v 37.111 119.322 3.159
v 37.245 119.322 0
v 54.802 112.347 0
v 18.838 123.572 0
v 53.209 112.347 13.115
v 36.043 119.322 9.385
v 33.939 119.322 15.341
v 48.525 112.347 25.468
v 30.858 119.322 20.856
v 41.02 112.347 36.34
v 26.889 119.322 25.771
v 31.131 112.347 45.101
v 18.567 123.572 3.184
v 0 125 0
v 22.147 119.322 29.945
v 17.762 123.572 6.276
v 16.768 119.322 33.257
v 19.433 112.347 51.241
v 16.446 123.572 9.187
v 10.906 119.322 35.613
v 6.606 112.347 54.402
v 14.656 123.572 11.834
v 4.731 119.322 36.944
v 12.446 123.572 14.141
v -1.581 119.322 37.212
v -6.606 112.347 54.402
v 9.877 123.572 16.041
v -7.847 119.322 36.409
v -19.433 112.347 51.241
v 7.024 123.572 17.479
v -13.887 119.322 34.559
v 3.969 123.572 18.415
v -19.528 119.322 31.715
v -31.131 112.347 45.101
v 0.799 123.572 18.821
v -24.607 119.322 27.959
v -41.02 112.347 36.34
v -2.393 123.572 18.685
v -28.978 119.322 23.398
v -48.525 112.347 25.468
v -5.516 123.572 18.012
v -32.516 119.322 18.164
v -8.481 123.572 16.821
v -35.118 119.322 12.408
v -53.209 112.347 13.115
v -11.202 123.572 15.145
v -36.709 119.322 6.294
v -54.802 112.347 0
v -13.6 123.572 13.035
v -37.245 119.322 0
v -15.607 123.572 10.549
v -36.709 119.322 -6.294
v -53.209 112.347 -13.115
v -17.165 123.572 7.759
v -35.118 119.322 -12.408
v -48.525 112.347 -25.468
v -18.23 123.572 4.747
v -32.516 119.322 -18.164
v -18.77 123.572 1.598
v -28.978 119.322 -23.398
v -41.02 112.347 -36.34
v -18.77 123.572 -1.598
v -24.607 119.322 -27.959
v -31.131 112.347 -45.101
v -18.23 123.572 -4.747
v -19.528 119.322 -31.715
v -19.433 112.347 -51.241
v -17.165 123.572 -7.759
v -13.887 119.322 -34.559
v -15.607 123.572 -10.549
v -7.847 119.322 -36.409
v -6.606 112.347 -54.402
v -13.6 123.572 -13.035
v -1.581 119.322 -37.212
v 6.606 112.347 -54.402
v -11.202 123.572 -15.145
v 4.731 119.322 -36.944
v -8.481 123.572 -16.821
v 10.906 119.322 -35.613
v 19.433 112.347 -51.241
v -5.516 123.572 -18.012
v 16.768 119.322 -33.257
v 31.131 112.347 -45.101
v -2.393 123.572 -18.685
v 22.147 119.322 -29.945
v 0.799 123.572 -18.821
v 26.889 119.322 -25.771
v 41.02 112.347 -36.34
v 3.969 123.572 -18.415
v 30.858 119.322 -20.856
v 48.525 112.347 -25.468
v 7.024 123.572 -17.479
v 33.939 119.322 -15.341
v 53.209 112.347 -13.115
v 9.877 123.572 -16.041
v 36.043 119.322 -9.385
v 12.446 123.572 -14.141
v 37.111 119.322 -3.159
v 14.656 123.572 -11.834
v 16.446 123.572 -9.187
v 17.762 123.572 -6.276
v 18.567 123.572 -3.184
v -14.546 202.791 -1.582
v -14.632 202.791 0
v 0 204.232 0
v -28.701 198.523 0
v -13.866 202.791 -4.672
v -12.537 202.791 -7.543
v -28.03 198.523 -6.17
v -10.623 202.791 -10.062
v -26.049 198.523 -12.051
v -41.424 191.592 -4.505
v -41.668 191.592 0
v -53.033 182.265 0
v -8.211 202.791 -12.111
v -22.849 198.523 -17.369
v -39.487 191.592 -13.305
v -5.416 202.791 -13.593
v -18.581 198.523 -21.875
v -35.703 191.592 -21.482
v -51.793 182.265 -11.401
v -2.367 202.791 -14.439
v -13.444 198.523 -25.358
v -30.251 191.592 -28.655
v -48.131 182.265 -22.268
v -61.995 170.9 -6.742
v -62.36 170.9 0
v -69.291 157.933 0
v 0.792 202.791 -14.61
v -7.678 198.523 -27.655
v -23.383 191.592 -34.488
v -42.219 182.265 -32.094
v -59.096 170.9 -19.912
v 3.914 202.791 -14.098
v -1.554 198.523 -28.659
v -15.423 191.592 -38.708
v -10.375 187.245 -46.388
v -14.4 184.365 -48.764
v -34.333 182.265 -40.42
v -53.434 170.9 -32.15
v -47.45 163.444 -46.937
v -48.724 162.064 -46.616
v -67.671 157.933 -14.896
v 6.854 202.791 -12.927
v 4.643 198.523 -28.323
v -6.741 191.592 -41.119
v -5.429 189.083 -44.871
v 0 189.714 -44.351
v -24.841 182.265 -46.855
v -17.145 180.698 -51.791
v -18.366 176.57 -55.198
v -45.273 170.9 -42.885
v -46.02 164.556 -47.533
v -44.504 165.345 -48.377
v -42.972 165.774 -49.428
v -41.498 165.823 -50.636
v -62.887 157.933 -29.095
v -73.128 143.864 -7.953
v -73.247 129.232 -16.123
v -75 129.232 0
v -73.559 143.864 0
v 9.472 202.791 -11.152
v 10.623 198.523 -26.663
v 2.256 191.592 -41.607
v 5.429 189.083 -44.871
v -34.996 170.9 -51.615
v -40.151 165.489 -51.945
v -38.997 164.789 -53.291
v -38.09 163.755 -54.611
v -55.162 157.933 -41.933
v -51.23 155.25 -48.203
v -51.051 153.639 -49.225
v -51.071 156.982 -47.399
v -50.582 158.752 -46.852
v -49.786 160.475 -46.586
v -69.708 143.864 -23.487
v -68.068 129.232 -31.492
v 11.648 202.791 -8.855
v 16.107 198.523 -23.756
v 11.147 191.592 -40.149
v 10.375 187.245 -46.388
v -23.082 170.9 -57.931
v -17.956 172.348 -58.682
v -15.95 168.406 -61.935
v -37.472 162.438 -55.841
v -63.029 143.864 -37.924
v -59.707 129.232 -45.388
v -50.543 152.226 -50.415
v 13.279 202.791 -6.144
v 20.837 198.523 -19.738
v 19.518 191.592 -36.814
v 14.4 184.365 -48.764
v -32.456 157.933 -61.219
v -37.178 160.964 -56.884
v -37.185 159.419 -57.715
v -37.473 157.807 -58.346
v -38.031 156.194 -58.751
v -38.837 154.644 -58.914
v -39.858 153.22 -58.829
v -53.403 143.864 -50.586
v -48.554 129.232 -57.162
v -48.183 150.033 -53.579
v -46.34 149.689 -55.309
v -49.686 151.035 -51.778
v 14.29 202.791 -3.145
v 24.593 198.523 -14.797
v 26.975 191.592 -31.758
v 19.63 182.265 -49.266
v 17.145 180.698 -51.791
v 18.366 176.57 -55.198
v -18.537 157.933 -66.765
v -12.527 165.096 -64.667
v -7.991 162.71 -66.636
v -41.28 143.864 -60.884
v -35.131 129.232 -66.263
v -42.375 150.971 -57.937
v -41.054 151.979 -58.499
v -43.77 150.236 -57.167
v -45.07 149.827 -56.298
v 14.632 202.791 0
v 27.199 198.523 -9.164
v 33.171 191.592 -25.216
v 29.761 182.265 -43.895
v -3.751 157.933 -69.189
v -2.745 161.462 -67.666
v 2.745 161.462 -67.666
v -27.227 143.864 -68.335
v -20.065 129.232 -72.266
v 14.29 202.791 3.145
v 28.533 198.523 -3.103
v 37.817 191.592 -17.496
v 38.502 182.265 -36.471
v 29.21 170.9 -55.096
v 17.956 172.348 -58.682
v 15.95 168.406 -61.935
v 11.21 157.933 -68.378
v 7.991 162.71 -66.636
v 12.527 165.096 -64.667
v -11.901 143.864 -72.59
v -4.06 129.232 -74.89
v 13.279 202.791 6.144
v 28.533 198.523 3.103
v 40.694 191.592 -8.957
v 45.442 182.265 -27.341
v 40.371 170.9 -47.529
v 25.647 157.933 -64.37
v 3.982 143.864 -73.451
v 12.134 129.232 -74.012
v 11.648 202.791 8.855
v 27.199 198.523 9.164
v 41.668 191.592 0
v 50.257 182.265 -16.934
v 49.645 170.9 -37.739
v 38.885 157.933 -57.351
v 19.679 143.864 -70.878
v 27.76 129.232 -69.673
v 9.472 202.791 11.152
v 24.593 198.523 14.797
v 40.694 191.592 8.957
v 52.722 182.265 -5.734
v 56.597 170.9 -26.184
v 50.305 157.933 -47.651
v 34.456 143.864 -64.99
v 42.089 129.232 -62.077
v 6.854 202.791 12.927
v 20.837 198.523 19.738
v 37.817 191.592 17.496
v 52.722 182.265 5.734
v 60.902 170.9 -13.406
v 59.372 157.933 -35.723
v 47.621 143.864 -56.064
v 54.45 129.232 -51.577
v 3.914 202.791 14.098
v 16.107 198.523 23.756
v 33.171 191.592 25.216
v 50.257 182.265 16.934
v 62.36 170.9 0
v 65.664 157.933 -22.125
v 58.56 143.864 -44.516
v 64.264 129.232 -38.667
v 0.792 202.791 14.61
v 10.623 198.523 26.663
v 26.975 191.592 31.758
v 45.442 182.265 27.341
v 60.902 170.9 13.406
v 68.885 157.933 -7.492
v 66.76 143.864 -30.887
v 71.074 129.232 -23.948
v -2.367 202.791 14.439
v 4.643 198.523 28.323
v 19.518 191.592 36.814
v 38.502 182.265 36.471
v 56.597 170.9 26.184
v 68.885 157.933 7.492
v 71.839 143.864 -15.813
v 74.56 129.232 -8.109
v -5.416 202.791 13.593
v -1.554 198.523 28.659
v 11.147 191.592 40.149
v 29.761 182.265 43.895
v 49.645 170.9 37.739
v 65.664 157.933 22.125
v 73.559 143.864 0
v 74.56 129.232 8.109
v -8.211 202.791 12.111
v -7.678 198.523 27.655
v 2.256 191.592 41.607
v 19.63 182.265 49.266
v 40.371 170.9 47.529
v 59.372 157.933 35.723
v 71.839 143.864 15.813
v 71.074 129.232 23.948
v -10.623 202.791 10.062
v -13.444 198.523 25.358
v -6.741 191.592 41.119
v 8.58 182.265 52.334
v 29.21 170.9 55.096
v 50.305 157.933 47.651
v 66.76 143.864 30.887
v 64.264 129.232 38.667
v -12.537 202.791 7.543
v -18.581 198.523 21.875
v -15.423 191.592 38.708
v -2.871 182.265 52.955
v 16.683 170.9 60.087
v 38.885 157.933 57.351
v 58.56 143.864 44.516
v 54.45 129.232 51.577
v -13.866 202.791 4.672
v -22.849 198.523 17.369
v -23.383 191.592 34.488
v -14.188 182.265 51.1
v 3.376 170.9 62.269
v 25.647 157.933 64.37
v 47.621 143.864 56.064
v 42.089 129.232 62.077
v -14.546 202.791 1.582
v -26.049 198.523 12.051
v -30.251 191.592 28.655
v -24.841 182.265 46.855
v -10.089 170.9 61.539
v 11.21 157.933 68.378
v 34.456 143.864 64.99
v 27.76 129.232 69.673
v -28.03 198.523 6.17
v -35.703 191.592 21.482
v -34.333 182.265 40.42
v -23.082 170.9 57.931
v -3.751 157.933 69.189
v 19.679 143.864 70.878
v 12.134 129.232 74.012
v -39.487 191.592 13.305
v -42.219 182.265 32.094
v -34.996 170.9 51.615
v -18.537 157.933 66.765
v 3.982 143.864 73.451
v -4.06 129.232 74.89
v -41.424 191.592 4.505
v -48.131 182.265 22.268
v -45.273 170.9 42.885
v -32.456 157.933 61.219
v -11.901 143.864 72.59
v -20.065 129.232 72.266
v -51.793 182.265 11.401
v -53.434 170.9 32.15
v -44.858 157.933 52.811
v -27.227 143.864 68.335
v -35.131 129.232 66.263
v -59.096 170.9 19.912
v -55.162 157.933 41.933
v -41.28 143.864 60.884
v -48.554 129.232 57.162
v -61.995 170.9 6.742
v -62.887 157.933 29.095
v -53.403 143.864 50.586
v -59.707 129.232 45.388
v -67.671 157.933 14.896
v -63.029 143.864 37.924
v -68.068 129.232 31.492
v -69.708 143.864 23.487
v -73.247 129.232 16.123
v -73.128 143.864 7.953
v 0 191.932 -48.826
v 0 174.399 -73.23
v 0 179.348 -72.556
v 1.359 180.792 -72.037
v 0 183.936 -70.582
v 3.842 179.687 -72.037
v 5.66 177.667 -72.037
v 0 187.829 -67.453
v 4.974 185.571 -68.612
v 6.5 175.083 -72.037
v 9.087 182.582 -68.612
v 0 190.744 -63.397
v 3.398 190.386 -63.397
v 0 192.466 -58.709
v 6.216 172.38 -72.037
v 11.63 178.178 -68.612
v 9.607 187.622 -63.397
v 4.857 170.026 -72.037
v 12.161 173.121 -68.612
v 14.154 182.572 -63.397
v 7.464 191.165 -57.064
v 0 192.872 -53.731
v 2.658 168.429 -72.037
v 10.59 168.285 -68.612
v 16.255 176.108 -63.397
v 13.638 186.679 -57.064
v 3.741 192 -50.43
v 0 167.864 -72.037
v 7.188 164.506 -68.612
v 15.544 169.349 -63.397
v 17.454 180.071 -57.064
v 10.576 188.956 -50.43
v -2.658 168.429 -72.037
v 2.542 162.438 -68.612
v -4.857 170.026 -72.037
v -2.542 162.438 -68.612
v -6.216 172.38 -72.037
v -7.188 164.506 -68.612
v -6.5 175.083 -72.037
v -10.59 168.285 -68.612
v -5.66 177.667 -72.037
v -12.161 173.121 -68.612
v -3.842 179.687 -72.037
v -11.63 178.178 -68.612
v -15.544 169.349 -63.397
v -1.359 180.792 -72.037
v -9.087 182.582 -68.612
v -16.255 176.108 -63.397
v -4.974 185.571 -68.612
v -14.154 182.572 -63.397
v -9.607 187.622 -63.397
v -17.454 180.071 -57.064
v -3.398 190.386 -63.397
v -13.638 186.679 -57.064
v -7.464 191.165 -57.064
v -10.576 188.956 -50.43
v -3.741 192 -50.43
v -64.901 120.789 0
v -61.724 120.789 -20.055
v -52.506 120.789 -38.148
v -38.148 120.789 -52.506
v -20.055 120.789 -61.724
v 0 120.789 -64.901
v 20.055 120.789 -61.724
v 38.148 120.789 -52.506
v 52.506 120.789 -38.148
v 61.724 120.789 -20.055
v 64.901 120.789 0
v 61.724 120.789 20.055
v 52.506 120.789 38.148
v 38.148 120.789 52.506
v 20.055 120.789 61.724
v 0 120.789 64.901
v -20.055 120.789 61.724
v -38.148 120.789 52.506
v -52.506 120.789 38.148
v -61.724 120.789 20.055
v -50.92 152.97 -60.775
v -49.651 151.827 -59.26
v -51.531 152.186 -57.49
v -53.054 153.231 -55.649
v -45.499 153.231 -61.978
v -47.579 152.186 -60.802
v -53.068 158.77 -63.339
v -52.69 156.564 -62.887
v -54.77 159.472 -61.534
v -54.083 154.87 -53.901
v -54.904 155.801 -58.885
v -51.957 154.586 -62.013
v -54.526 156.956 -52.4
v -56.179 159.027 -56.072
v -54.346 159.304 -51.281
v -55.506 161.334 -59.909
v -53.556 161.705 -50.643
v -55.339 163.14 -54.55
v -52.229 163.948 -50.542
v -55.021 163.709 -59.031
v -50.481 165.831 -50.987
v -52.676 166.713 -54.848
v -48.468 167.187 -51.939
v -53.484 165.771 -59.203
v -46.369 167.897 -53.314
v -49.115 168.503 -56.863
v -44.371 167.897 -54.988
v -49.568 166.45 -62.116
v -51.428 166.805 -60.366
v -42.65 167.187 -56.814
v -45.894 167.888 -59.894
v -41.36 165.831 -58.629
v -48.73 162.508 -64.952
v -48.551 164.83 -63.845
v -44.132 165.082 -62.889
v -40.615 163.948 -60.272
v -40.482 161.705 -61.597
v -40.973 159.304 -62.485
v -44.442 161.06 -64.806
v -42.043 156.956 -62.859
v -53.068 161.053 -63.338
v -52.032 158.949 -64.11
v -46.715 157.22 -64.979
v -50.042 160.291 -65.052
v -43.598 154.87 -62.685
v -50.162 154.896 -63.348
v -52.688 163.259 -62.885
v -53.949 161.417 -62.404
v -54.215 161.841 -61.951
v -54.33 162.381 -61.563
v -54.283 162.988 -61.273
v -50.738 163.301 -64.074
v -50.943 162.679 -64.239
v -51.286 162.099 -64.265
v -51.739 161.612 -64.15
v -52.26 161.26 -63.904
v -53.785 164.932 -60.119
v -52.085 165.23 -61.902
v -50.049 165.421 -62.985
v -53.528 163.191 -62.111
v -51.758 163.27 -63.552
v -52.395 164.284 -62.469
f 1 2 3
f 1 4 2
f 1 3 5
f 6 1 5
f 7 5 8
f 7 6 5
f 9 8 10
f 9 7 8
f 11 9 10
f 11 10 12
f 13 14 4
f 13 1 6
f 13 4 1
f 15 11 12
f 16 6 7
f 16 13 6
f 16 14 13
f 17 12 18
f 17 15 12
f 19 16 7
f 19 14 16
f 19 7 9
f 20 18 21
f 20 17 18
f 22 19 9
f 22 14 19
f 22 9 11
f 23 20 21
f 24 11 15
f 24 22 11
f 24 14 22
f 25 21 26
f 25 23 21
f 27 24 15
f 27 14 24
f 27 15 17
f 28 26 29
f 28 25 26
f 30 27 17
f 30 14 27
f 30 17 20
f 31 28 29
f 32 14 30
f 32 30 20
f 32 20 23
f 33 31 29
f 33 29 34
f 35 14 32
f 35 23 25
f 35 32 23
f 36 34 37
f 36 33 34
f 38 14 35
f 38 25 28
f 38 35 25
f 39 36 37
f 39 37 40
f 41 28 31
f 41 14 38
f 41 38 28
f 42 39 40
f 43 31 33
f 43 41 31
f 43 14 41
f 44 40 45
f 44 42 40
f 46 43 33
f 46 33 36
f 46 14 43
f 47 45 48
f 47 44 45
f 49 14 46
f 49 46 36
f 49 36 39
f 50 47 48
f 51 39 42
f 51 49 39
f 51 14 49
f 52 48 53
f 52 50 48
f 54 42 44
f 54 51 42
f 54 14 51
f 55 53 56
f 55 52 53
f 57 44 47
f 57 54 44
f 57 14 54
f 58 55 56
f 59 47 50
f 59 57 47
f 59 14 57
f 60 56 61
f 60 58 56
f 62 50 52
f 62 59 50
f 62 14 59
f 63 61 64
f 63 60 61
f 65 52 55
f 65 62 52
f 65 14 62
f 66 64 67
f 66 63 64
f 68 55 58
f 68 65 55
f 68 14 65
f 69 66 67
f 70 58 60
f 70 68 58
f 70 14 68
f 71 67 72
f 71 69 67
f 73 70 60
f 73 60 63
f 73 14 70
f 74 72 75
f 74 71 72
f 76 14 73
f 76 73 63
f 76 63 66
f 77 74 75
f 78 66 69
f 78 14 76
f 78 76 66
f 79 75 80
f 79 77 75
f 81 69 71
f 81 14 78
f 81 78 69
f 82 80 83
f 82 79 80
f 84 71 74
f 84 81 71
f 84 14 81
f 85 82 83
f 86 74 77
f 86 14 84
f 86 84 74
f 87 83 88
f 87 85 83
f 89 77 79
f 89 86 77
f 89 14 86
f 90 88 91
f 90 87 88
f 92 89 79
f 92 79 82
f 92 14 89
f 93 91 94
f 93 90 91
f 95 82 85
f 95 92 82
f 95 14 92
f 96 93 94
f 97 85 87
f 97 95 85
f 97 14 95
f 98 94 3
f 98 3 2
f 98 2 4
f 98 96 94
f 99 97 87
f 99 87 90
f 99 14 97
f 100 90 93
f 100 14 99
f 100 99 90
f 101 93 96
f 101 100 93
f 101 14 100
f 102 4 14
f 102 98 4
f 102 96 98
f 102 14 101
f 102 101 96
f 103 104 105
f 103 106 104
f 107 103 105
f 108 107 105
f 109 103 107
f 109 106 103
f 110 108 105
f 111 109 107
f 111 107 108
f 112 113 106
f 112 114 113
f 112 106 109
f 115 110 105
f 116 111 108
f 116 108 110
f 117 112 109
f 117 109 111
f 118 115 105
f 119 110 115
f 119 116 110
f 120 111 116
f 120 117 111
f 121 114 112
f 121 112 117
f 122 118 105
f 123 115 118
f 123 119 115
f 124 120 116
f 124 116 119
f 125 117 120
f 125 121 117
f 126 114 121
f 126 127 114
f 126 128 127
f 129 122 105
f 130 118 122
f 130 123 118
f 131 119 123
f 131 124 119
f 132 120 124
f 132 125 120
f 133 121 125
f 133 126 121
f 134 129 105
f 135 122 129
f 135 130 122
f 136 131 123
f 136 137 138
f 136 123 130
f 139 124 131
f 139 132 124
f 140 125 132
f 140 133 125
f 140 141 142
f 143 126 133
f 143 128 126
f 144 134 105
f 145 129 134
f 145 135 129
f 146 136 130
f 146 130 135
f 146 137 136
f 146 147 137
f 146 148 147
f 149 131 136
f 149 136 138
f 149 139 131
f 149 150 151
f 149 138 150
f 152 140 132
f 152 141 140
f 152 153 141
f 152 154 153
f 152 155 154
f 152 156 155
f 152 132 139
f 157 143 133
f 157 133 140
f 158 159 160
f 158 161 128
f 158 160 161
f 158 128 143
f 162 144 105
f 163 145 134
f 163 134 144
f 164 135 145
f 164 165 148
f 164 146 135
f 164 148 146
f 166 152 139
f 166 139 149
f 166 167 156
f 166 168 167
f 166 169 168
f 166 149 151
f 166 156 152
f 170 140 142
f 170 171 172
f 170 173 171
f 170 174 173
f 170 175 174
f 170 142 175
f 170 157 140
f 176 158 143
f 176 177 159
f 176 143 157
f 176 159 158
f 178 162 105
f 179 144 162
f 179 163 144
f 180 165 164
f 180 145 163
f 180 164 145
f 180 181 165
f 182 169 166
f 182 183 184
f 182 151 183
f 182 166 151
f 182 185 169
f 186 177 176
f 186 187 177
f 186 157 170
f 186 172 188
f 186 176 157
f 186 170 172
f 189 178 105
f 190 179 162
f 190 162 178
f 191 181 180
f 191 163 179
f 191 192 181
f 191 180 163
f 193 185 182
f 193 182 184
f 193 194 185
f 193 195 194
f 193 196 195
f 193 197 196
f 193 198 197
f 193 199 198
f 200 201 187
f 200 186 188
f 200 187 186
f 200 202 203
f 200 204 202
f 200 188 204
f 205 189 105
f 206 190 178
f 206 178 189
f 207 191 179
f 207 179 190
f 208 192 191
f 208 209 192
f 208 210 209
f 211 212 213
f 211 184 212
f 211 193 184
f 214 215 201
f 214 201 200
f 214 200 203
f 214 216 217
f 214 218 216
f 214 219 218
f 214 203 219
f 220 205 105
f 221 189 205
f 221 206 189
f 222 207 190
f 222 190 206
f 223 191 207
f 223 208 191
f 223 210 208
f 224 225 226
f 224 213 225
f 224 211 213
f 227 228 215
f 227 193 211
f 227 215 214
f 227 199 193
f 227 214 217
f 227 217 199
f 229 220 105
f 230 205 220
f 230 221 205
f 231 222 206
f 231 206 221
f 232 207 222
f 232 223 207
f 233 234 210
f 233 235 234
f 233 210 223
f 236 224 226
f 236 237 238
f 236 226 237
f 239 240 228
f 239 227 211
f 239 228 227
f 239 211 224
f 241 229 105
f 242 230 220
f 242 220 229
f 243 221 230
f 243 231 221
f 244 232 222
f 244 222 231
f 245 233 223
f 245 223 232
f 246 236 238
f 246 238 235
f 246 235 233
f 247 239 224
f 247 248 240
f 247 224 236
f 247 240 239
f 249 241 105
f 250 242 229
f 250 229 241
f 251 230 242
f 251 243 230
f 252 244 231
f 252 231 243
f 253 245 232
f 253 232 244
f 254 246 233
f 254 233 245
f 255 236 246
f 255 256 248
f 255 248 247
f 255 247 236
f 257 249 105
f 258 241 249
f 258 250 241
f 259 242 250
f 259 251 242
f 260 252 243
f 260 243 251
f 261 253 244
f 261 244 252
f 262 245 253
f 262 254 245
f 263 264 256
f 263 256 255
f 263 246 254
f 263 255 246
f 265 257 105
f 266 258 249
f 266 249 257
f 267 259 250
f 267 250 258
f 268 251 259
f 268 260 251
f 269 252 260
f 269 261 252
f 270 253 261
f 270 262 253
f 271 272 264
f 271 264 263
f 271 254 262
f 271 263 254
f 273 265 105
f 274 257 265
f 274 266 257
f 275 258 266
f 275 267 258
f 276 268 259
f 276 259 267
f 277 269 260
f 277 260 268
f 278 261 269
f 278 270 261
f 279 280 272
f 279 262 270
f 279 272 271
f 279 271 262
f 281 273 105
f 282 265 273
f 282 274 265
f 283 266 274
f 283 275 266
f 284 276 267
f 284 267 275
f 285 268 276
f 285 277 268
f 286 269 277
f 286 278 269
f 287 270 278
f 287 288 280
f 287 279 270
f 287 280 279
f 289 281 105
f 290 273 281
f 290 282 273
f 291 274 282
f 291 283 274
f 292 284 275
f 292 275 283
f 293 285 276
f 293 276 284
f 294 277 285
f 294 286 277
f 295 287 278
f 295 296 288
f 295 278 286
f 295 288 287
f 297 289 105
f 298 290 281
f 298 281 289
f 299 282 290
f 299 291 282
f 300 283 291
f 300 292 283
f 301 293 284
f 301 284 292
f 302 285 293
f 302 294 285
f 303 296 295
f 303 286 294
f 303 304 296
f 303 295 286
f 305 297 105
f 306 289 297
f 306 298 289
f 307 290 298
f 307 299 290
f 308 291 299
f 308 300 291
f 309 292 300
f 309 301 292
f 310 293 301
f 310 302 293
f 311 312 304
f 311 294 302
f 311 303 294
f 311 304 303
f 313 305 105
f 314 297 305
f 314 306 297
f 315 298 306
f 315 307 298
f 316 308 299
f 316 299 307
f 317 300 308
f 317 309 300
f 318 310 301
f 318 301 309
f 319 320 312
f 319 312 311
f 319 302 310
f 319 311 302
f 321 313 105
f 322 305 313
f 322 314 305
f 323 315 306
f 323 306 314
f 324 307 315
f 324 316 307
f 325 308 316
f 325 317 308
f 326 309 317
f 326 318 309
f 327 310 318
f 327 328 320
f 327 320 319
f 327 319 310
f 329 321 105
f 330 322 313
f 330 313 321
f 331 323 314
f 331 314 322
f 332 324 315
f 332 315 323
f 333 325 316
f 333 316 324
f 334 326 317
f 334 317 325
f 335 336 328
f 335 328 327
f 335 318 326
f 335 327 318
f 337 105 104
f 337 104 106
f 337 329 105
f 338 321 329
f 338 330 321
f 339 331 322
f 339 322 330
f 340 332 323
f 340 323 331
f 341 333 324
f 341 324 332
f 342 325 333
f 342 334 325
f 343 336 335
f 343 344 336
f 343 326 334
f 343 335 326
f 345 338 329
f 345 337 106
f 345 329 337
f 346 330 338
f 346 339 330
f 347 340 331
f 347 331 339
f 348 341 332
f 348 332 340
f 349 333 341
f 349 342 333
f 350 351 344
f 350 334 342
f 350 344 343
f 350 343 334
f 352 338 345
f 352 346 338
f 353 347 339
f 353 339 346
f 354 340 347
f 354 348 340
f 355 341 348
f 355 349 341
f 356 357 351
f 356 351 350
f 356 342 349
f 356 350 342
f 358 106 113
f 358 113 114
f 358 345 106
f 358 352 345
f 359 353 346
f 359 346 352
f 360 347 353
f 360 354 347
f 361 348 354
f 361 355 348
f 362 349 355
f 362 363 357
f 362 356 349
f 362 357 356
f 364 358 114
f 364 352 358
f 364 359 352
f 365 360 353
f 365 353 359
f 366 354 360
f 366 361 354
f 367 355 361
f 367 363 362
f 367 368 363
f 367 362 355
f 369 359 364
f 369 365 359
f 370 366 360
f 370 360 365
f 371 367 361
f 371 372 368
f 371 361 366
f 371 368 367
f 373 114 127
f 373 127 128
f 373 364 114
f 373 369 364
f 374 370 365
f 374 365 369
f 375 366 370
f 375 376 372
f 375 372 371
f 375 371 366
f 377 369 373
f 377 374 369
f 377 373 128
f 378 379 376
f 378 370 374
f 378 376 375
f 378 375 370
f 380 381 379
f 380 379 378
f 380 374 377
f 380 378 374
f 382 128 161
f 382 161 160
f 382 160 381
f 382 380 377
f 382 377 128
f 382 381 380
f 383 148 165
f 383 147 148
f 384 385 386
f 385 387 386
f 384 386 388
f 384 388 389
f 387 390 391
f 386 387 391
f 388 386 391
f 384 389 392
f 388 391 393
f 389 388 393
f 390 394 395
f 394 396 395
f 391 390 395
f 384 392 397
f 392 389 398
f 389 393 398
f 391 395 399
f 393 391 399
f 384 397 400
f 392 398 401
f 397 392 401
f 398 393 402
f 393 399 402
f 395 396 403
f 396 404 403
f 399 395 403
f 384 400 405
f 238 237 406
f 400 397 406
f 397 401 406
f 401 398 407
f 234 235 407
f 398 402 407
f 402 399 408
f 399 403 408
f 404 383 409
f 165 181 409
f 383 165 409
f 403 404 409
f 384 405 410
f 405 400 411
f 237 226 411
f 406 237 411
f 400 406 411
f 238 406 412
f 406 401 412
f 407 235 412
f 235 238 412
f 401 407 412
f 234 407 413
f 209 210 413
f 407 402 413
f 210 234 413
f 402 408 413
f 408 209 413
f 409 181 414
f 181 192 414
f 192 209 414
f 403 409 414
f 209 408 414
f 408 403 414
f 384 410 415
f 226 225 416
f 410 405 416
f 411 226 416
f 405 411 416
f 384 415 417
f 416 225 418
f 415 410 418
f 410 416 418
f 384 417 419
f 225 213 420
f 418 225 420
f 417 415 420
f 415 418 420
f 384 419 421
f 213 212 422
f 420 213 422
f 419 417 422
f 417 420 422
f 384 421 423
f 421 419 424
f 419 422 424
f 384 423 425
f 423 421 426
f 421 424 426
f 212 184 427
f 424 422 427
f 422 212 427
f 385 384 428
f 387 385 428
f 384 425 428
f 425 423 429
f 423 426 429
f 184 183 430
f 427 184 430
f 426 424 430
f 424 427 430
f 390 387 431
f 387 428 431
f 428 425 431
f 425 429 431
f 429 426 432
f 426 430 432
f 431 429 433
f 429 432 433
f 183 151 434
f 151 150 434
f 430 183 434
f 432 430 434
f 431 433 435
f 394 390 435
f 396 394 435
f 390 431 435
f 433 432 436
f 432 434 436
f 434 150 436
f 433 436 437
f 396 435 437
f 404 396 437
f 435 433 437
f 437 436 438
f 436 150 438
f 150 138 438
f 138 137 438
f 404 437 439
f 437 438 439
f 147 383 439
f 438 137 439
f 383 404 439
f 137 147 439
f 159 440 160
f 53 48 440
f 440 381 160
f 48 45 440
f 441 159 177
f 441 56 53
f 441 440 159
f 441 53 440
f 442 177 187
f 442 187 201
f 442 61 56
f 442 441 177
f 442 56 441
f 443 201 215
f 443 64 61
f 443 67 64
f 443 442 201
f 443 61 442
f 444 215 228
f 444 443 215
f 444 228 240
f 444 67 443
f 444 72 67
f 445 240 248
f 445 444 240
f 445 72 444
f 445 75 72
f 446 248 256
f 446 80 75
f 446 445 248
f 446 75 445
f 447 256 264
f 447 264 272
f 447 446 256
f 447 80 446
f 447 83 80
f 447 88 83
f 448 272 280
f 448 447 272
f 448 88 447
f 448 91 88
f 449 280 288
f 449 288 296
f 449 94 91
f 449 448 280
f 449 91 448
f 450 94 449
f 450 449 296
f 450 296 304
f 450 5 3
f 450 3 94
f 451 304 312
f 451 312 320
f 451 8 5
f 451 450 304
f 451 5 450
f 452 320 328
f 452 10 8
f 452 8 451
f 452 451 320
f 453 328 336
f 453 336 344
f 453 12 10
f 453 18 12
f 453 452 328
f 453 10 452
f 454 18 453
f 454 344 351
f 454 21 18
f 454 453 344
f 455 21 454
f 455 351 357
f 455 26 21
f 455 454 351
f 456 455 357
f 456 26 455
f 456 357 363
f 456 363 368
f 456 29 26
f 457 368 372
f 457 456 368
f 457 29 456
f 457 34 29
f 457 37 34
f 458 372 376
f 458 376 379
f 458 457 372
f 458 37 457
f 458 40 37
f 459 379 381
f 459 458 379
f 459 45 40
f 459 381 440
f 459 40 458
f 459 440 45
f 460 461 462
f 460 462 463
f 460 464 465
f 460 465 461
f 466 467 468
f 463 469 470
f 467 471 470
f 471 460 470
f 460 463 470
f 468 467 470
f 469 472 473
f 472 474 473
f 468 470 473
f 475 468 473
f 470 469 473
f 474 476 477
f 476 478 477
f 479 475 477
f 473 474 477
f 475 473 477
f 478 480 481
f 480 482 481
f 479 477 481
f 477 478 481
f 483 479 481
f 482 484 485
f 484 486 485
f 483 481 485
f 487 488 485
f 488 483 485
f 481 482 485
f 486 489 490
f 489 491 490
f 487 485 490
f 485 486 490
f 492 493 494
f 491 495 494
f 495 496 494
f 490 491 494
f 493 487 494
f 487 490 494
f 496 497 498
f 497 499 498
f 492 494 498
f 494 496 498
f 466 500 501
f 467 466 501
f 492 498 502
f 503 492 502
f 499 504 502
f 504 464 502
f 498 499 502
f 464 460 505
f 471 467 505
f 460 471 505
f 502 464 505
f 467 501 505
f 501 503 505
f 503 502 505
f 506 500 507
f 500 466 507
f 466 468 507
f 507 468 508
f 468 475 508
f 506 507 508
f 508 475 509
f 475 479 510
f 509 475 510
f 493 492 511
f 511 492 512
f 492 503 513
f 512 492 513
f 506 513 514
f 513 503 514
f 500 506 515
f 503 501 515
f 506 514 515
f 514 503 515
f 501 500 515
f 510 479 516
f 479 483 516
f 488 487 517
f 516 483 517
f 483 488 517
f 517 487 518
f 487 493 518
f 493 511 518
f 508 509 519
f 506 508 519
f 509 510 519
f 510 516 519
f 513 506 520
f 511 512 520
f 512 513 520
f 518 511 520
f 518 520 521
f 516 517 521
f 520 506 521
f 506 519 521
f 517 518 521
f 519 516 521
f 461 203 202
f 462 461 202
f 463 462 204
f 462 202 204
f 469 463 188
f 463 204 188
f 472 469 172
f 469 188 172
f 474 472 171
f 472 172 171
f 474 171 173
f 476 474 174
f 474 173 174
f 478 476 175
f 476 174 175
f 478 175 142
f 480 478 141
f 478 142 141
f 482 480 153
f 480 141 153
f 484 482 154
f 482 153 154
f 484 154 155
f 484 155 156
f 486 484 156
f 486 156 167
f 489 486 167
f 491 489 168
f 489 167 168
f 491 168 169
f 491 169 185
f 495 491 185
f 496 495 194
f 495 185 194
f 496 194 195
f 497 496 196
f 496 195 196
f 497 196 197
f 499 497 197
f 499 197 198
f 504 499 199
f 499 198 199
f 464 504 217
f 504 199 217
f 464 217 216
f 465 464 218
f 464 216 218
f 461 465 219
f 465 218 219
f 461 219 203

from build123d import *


with BuildPart() as part:
    # 草图1 → 旋转1 (revolve)
    with BuildSketch(Plane.XY):
        with BuildLine():
            Line((-75, 129.232052778), (-54.801890605, 112.34657443))
            ThreePointArc((-54.801890605, 112.34657443), (-28.12186157, 121.795570124), (0, 125))
            Line((0, 125), (0, 204.232052778))
            ThreePointArc((0, 204.232052778), (-53.033008589, 182.265061367), (-75, 129.232052778))
        make_face()
    revolve(axis=Axis((0, 213.081349398, 0), (0, -1, 0)))

    # 草图6 → 旋转2 (revolve)
    with BuildSketch(Plane(origin=(0, 0, 0), x_dir=(0, 0, -1), z_dir=(1, 0, 0))):
        with BuildLine():
            Line((36.229745399, 174.39946224), (73.229745399, 174.39946224))
            ThreePointArc((73.229745399, 174.39946224), (54.729745399, 192.89946224), (36.229745399, 174.39946224))
        make_face()
    revolve(axis=Axis((0, 174.39946224, 0), (0, 0, -1)))

    # 草图9 → 旋转4 (revolve)
    with BuildSketch(Plane(origin=(0, 0, 0), x_dir=(0, 1, 0), z_dir=(-0.7665183822714032, 0, 0.6422223677512571))):
        with BuildLine():
            Line((156.556180661, 65.879169876), (163.258797924, 82.039351206))
            ThreePointArc((163.258797924, 82.039351206), (156.56373545, 82.042480502), (151.827398627, 77.310569172))
            Line((151.827398627, 77.310569172), (148.476089996, 69.230478507))
            Line((148.476089996, 69.230478507), (156.556180661, 65.879169876))
        make_face()
    revolve(axis=Axis((0, 129.232052778, 0), (-0.5932211633183806, 0.3831152150832898, -0.7080334620361328)))

    # 草图15 → 旋转5 (revolve)
    with BuildSketch(Plane.XY):
        with BuildLine():
            Line((0, 125), (0, -125))
            ThreePointArc((0, -125), (125, 0), (0, 125))
        make_face()
    revolve(axis=Axis((0, 143.905509185, 0), (0, -1, 0)))

    # 草图15<3> → 切除-旋转5 (revolve, cut)
    with BuildSketch(Plane.XY):
        with BuildLine():
            Line((0, 125), (0, -125))
            ThreePointArc((0, -125), (125, 0), (0, 125))
        make_face()
    revolve(axis=Axis((0, 143.905509185, 0), (0, -1, 0)), mode=Mode.SUBTRACT)


solid = part.part
